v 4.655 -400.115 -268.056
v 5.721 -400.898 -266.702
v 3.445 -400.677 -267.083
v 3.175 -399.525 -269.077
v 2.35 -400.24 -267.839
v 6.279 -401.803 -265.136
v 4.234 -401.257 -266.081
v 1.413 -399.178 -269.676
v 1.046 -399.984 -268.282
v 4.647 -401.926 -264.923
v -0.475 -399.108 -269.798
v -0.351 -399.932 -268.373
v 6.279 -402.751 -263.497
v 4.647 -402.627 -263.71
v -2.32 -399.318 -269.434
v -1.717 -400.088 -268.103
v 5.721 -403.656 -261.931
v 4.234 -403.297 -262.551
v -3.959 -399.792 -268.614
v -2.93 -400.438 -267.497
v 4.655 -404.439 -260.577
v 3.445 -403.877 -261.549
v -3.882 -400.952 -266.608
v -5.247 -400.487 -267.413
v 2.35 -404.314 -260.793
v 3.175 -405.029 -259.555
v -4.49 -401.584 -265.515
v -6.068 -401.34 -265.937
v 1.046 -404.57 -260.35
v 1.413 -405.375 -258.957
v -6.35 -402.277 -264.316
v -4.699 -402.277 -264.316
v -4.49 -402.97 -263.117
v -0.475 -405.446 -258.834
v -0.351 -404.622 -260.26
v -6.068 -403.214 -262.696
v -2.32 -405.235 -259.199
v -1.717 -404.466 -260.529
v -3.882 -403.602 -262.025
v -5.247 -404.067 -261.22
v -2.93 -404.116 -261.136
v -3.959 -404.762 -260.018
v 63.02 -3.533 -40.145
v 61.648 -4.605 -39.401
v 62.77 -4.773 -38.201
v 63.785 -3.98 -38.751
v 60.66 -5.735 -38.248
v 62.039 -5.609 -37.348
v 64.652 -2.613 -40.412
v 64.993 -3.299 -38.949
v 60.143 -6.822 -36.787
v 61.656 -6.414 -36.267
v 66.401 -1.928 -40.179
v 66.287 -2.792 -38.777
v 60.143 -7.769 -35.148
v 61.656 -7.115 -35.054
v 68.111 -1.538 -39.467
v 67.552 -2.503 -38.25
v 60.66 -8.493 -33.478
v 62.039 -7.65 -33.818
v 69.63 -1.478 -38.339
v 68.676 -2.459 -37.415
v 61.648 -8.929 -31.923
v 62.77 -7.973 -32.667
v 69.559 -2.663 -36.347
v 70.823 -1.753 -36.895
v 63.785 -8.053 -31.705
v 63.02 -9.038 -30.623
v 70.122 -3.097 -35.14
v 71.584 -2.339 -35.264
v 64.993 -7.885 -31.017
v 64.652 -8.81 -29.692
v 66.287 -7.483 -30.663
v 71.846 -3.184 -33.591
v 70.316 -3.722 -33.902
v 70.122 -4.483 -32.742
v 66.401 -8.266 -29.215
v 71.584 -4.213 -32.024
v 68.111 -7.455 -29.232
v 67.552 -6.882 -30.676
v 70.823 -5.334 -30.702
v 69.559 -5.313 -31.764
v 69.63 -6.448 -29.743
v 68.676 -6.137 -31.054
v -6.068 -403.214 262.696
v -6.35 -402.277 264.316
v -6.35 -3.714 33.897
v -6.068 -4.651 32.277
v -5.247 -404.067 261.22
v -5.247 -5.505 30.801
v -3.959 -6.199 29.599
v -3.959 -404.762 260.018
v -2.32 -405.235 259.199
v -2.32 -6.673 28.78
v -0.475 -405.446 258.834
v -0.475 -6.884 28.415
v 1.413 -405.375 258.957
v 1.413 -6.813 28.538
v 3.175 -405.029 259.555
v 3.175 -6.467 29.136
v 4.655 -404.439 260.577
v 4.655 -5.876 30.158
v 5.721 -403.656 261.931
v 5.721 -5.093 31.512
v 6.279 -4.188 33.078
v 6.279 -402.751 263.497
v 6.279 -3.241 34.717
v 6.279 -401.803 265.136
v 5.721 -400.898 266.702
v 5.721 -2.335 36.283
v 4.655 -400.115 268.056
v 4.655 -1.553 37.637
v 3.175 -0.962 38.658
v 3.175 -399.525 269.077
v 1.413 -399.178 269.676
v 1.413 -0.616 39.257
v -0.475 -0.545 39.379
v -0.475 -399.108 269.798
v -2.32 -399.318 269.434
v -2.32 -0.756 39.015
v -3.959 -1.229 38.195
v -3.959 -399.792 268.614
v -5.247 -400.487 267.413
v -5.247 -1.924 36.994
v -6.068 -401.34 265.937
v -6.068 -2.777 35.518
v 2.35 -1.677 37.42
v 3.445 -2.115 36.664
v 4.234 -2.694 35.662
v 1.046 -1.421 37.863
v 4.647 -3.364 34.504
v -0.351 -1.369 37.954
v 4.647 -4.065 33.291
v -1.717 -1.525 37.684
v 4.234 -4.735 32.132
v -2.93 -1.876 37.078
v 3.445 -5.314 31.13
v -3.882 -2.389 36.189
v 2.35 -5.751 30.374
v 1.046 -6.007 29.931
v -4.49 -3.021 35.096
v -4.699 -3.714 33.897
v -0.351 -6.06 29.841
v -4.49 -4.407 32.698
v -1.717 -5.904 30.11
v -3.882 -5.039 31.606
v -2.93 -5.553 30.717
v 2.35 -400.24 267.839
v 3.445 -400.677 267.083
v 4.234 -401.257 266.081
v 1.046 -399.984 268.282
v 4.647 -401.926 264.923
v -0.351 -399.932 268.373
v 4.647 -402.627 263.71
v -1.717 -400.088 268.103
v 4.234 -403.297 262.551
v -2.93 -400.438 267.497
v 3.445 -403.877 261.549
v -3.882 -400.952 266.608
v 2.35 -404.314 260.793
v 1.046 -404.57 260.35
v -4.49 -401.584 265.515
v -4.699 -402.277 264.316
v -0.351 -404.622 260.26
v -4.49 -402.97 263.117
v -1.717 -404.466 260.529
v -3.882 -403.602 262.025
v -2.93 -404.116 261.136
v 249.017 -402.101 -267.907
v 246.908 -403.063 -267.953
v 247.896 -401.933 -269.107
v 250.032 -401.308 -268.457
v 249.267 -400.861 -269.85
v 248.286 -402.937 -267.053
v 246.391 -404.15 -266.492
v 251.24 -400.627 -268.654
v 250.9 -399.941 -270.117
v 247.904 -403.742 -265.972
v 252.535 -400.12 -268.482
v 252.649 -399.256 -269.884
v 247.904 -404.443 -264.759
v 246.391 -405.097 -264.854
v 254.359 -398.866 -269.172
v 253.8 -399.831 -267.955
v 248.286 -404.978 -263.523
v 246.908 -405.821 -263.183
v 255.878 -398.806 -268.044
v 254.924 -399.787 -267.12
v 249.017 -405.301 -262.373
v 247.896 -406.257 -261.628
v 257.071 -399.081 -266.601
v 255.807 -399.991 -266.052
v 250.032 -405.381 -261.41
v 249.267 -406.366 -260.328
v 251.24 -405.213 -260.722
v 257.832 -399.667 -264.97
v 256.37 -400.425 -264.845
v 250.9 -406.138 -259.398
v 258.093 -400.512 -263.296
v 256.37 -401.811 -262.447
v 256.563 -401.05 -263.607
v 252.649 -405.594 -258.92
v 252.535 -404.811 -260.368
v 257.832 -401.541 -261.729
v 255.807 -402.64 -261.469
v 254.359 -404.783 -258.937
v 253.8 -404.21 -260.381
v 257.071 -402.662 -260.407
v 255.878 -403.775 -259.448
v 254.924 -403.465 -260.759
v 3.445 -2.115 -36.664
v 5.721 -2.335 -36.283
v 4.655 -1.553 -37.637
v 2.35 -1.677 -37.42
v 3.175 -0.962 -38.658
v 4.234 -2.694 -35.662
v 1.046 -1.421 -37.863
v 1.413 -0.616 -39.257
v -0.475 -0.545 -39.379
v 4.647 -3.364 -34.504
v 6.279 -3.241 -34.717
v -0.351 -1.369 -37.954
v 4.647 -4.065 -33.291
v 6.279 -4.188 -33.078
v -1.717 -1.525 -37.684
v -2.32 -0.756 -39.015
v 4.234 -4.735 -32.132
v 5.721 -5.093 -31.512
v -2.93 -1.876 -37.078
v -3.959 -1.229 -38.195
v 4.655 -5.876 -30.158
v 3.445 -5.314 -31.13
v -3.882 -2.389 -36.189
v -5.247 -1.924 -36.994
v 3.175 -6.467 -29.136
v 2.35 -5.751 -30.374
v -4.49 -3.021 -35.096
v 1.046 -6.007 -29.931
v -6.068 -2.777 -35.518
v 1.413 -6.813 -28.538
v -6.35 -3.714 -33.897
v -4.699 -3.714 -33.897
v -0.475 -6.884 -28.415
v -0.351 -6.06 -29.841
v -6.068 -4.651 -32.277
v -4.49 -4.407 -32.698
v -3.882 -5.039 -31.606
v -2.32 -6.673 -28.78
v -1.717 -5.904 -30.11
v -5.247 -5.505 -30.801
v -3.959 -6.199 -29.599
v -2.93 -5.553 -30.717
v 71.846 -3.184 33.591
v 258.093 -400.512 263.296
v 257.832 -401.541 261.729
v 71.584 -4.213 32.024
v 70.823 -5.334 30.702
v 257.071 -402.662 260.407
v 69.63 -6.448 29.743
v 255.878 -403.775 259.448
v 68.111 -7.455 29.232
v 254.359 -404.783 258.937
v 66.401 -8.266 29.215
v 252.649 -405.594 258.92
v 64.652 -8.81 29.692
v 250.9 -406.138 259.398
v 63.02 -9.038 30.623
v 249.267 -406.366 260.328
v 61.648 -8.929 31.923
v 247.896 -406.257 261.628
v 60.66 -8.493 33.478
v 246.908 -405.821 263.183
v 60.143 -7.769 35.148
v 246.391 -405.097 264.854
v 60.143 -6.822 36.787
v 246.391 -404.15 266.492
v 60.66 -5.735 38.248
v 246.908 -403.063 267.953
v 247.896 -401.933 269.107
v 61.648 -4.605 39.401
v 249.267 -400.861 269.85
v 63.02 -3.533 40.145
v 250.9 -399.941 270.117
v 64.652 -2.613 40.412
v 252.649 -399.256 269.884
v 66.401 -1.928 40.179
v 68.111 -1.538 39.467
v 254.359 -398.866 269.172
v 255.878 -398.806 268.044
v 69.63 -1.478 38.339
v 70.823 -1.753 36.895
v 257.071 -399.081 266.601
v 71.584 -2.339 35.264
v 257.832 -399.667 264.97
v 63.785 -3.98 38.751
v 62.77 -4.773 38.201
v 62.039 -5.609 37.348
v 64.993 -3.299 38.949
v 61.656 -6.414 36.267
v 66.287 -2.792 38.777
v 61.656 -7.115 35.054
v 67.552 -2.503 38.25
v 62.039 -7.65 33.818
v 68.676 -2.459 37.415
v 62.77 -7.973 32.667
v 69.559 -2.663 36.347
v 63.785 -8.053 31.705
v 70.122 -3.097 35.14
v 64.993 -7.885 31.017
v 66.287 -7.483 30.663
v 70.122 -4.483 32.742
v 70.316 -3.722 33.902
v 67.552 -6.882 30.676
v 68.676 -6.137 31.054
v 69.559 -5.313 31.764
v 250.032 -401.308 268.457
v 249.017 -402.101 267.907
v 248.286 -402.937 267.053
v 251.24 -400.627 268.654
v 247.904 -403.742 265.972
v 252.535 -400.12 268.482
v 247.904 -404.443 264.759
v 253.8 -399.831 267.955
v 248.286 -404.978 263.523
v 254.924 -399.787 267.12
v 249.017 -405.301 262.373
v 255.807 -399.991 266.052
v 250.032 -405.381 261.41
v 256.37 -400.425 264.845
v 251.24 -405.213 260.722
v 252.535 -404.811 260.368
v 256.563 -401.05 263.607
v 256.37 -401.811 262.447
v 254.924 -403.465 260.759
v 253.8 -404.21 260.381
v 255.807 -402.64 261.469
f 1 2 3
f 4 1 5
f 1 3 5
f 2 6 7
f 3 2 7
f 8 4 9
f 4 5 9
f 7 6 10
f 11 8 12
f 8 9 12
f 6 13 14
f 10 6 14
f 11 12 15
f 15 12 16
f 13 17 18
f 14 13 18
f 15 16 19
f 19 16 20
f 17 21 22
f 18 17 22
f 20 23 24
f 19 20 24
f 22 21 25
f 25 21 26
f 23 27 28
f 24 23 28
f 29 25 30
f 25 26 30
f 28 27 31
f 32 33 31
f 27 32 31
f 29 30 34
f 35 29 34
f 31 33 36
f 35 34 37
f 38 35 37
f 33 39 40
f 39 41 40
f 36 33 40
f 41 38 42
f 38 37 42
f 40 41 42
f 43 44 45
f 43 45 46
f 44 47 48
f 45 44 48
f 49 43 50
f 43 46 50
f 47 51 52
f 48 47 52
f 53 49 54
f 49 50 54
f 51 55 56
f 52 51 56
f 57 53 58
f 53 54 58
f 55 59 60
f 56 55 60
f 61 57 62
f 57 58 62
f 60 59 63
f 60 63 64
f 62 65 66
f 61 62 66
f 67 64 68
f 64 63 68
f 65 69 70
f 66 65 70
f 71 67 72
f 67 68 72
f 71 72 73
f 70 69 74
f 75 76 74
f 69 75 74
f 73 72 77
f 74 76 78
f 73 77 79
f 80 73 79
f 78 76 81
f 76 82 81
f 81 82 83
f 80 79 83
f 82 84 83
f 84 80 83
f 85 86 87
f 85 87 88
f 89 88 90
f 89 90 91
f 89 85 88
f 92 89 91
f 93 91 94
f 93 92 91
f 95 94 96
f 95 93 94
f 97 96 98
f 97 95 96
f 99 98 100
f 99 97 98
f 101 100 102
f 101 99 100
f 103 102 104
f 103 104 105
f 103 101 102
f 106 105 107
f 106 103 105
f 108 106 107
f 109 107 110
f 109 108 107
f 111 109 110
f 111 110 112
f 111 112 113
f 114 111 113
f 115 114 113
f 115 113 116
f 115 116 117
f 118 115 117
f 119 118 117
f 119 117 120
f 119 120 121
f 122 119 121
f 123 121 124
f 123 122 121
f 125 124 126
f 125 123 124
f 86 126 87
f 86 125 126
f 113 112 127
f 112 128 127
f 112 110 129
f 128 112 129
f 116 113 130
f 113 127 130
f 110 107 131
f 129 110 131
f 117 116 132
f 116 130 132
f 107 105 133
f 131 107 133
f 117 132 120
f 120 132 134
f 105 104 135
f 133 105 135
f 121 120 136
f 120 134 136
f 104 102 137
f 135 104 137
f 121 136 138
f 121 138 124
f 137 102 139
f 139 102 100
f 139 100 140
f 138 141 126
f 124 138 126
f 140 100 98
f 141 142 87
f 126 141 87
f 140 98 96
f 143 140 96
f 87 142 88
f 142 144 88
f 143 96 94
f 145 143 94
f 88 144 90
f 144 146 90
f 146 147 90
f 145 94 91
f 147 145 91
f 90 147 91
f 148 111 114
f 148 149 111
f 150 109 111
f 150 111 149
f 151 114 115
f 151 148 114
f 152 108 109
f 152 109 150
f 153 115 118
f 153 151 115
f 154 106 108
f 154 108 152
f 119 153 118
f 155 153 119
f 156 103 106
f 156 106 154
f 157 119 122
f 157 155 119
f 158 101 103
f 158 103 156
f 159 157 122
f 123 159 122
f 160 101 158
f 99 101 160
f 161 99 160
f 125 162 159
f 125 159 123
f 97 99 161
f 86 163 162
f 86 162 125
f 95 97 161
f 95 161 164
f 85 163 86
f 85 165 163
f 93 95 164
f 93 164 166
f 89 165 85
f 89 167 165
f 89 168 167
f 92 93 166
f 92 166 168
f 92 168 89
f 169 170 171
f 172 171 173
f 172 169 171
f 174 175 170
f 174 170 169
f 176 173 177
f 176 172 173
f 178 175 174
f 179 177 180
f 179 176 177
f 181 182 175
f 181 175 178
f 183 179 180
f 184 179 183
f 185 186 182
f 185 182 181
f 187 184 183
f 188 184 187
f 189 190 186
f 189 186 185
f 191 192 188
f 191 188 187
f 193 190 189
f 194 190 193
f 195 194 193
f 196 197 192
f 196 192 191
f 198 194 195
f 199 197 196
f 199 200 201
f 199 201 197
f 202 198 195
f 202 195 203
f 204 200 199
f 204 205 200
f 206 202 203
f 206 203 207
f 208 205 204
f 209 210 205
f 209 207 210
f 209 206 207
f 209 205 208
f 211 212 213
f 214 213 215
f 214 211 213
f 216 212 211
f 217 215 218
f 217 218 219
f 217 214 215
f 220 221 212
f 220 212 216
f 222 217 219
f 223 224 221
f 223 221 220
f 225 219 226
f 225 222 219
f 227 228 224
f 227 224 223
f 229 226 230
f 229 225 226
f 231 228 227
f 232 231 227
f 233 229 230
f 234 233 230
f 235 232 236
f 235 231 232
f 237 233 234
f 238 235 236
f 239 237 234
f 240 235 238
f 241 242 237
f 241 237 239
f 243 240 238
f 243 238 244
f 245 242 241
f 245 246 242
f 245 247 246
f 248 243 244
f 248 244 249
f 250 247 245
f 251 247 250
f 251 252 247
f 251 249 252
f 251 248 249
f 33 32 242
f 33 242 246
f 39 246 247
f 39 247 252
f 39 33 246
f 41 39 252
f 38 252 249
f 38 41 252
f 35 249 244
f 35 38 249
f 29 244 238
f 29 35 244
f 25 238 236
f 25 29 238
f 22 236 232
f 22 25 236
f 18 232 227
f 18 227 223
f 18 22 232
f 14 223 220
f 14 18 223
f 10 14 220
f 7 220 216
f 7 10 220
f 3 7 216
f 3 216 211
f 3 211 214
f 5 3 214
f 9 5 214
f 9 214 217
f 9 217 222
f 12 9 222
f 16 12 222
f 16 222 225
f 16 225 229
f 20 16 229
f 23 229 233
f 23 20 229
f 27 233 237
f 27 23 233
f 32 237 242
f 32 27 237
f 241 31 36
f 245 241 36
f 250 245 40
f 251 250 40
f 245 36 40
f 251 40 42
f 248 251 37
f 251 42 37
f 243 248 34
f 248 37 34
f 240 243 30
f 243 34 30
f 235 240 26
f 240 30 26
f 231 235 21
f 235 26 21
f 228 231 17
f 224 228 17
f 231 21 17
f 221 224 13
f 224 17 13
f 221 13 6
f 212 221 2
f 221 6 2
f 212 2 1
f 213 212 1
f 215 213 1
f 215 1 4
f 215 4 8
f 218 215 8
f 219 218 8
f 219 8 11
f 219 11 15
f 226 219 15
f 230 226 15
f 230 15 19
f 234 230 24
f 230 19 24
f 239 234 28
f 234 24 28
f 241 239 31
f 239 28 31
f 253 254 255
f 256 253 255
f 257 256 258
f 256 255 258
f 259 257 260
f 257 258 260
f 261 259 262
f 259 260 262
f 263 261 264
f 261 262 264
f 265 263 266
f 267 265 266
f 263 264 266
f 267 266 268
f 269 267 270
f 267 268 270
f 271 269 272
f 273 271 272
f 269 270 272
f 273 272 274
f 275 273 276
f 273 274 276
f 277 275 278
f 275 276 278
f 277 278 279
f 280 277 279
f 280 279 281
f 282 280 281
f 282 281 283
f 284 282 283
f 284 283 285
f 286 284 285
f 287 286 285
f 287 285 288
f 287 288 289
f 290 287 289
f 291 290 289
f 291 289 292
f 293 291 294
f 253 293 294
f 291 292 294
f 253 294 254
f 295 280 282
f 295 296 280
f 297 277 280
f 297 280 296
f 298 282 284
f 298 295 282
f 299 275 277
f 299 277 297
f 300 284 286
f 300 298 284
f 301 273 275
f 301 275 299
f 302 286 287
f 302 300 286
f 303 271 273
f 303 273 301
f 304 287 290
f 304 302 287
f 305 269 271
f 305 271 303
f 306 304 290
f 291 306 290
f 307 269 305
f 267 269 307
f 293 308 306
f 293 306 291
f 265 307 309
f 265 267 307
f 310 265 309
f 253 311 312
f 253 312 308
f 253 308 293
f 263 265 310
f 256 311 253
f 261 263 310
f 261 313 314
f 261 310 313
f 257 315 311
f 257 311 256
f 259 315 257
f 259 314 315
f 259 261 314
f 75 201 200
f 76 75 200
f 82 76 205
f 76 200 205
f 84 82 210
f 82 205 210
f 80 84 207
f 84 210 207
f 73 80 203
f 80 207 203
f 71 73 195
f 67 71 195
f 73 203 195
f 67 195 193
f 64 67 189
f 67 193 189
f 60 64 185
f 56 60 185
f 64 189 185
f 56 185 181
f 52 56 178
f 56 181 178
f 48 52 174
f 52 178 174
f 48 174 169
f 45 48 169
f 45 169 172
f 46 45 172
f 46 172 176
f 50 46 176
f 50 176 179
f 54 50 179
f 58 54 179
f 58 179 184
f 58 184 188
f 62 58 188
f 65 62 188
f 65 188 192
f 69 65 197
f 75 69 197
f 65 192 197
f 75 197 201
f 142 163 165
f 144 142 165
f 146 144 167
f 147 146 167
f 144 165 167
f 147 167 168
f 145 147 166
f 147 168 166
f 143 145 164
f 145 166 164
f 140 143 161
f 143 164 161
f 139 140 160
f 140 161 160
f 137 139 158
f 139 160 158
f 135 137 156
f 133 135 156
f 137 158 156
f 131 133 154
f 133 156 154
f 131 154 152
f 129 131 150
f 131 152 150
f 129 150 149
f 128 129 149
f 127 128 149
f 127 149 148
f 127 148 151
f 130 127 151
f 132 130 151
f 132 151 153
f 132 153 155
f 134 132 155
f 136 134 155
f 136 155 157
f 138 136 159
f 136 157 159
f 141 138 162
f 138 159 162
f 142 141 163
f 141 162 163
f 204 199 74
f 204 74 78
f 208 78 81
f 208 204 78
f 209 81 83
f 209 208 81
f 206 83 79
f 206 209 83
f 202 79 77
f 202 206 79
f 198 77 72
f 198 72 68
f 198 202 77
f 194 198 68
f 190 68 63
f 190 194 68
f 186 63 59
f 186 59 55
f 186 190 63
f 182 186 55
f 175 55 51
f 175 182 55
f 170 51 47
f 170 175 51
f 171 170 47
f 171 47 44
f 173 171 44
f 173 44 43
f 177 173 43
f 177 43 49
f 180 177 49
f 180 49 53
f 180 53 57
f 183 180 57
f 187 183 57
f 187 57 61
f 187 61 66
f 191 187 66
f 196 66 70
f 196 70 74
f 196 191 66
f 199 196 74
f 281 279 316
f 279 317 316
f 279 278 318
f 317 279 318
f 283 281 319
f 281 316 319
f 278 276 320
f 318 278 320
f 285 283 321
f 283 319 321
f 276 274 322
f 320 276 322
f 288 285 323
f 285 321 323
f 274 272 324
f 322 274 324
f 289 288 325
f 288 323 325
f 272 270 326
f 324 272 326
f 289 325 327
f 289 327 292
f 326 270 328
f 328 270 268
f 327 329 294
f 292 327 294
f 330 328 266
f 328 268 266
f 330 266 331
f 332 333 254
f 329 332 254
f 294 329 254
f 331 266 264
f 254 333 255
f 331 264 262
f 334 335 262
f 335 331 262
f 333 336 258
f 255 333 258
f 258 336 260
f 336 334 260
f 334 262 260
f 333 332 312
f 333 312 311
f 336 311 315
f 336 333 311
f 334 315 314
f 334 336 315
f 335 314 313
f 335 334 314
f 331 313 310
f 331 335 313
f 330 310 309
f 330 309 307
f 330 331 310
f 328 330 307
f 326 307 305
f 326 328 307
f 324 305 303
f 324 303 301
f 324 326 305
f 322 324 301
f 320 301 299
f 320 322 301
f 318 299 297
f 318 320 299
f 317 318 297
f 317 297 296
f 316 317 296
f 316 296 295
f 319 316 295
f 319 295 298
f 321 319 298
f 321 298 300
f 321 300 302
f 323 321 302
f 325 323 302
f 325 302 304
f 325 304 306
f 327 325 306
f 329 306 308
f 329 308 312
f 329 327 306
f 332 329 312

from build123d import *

# Parameters (mm, degrees)
BOSS_EXTRUDE1_START = -4.7625
SKETCH4_R           = 6.35
SKETCH4_R_2         = 4.699
BOSS_EXTRUDE1_DEPTH = 460.375
BOSS_EXTRUDE2_START = 4.7625
SKETCH5_R           = 6.35
SKETCH5_R_2         = 4.699
BOSS_EXTRUDE2_DEPTH = 495.3


with BuildPart() as part:
    # Sketch4 → Boss-Extrude1 (new body)
    with BuildSketch(Plane(origin=(0, -406.4, 266.7), x_dir=(-1, 0, 0), z_dir=(0, -0.865734831, 0.500502949)).offset(BOSS_EXTRUDE1_START)):
        Circle(SKETCH4_R)
        Circle(SKETCH4_R_2, mode=Mode.SUBTRACT)
    extrude(amount=-BOSS_EXTRUDE1_DEPTH)


with BuildPart() as body_2:
    # Sketch5 → Boss-Extrude2 (new body)
    with BuildSketch(Plane(origin=(254, -406.4, 266.7), x_dir=(0.926607645, 0.325541936, -0.188203932), z_dir=(-0.376029616, 0.802196513, -0.463769859)).offset(BOSS_EXTRUDE2_START)):
        Circle(SKETCH5_R)
        Circle(SKETCH5_R_2, mode=Mode.SUBTRACT)
    extrude(amount=BOSS_EXTRUDE2_DEPTH)


with BuildPart() as body_3:
    # Mirror1: mirrored copy
    add(part.part.mirror(Plane.XY))


with BuildPart() as body_4:
    # Mirror1 2: mirrored copy
    add(body_2.part.mirror(Plane.XY))


solid = Compound([part.part, body_2.part, body_3.part, body_4.part])
